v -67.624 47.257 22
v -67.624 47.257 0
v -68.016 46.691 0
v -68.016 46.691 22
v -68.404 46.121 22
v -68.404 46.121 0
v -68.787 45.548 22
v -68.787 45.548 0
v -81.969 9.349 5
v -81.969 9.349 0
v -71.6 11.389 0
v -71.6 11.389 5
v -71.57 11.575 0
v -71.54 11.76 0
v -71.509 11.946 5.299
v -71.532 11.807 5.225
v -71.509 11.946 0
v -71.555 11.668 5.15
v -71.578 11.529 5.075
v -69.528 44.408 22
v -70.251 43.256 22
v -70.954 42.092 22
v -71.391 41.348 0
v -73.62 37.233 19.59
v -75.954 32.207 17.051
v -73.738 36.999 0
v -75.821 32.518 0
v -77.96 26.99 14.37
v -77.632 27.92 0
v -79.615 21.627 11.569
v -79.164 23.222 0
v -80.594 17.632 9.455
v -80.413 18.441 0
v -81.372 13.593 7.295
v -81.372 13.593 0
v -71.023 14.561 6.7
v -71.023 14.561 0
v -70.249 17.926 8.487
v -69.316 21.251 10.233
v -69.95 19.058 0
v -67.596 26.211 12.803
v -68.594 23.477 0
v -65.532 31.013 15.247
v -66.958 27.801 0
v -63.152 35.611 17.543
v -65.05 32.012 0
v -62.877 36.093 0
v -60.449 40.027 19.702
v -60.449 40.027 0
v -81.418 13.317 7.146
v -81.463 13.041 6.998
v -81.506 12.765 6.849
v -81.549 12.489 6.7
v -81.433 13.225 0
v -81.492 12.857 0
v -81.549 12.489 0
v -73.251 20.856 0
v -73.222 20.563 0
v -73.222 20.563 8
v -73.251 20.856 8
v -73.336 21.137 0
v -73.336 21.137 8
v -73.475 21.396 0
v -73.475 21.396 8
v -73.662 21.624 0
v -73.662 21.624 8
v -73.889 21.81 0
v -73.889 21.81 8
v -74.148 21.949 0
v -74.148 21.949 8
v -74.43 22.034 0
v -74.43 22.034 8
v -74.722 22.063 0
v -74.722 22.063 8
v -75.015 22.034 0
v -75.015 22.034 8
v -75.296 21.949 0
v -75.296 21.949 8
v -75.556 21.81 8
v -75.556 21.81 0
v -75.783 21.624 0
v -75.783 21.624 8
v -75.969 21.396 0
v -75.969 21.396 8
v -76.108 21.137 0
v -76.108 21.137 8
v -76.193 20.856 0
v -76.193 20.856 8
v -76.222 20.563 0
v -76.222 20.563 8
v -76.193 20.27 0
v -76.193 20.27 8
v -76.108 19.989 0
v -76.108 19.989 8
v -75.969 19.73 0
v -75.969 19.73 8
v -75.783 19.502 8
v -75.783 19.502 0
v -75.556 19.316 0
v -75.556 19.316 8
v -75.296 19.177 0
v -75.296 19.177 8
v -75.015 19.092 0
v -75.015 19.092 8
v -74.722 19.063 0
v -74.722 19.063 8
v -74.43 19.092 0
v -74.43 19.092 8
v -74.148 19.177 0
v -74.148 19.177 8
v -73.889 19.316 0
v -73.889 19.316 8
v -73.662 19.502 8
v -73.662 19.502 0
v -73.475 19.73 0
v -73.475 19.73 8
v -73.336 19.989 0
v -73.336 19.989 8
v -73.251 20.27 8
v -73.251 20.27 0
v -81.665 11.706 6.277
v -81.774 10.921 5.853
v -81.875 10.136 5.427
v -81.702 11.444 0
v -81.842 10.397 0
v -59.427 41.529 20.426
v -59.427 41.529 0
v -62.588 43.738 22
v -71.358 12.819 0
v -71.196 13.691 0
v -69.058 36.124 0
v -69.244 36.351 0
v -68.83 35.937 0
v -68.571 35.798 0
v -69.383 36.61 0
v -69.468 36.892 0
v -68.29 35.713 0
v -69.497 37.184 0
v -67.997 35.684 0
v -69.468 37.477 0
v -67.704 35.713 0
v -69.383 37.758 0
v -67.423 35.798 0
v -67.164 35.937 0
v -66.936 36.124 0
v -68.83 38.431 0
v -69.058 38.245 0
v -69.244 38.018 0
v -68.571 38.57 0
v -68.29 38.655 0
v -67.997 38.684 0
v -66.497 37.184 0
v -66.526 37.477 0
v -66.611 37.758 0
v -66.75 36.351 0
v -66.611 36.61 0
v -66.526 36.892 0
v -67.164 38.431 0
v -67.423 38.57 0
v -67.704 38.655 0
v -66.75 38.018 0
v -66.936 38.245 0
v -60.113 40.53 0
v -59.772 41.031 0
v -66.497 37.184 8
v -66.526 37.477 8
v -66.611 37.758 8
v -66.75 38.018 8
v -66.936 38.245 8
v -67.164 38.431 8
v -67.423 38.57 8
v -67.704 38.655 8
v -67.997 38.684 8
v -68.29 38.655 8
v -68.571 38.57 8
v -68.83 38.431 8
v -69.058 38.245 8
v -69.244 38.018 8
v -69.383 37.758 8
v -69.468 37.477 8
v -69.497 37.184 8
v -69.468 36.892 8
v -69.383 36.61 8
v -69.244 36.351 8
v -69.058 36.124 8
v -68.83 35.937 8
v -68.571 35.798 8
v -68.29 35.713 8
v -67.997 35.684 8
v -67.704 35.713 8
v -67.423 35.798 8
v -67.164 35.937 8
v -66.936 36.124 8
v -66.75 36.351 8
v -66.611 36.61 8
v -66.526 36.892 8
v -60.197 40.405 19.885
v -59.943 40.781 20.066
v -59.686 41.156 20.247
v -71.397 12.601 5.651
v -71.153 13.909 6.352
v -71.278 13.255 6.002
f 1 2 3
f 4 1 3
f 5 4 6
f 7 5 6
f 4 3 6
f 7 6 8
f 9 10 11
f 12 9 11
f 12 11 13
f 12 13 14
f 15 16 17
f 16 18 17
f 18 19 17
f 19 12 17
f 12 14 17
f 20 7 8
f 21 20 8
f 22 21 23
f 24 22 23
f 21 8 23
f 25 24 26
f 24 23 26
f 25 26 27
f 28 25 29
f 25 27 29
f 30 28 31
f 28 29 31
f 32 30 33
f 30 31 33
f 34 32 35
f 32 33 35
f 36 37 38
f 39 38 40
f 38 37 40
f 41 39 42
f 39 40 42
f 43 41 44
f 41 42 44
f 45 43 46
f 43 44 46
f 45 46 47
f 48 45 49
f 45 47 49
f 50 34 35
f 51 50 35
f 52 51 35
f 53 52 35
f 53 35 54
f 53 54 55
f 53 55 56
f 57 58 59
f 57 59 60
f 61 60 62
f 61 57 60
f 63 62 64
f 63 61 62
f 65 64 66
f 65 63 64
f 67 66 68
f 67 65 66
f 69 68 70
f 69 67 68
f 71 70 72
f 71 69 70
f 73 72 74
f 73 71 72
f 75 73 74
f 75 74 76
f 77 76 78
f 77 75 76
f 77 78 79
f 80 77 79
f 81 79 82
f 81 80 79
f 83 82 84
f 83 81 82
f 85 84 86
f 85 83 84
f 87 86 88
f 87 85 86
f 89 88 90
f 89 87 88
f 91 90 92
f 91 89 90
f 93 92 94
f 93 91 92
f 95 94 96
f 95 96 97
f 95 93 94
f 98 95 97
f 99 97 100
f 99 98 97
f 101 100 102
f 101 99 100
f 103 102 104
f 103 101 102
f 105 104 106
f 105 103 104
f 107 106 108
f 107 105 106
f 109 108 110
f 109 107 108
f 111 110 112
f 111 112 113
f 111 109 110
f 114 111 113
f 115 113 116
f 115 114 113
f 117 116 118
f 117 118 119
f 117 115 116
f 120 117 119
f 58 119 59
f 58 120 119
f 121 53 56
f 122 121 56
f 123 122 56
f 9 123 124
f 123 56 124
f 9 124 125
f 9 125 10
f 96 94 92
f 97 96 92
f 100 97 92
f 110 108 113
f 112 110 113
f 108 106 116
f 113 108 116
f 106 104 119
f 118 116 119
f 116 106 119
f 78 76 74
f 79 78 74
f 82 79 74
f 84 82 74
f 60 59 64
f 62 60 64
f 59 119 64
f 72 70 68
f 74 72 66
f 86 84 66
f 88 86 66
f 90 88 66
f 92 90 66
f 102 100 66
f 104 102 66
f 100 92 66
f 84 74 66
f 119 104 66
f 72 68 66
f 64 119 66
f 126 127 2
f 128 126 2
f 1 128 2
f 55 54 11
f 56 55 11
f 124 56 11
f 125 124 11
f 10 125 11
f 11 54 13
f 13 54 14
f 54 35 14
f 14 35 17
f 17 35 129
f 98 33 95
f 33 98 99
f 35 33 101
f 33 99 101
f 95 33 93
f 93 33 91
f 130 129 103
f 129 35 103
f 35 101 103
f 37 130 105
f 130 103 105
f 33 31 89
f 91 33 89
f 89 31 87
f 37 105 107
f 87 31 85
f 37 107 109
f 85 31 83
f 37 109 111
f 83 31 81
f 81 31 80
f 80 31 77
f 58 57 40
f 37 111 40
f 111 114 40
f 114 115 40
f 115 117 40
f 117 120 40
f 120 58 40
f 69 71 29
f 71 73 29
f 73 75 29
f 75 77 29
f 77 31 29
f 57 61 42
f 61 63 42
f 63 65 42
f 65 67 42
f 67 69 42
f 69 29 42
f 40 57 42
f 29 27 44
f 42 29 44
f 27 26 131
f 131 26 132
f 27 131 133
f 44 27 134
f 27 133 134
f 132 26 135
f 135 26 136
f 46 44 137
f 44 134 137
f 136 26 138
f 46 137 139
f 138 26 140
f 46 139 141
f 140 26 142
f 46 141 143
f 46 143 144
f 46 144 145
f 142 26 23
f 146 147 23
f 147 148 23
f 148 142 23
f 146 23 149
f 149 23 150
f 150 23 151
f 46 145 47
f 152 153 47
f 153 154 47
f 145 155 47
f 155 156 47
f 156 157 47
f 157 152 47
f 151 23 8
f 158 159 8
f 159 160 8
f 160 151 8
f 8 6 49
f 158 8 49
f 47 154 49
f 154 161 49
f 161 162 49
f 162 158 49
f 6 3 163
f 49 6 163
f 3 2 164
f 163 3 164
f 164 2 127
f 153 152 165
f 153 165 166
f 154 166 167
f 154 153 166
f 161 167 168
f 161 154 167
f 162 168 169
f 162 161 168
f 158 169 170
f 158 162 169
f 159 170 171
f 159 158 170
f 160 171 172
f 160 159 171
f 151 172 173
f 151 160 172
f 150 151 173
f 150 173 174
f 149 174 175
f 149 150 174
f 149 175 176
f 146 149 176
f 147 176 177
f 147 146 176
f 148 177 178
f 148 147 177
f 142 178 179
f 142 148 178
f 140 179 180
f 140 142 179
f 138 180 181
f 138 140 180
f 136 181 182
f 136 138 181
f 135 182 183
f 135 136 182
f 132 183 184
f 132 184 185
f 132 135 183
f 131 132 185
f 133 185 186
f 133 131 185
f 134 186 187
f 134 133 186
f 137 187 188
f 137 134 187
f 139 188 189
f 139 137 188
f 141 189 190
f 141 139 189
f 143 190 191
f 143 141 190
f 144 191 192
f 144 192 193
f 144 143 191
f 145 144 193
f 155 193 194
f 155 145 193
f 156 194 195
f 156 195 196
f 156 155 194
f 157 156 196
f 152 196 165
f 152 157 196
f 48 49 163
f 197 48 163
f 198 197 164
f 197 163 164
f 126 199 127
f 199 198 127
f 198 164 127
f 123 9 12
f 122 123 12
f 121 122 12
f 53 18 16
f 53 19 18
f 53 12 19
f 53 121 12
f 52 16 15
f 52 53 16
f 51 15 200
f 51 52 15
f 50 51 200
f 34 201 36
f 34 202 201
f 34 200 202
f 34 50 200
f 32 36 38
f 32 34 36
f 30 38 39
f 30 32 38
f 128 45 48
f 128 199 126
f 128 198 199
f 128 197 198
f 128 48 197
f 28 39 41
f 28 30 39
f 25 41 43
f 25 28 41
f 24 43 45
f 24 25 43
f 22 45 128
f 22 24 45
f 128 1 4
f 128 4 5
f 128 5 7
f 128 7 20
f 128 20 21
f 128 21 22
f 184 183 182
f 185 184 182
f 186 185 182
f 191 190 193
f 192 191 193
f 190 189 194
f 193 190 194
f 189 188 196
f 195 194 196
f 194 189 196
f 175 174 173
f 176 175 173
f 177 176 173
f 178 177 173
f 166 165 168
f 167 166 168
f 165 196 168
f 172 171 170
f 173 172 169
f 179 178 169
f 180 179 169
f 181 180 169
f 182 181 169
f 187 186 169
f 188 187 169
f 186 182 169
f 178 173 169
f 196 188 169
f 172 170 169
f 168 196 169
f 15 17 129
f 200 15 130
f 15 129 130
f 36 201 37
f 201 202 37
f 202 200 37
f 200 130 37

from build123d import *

# Parameters (mm, degrees)
F0_R        = 1.5
F1_DEPTH    = 22
F2_T1_DEPTH = 165.8159550338
F3_DEPTH    = 8


# Not quite as in the source:
# - a fillet or chamfer that OpenCascade refuses, or shapes differently, is made with other operations: its cross-section is extruded or revolved along the edge and cut away or added


with BuildPart() as f1:
    # F0 (on Top) → F1 (new body)
    with BuildSketch(Plane.XY):
        with BuildLine():
            ThreePointArc((-71.5091042417, 11.9456272565), (-71.2779515077, 13.2553245479), (-71.0228136012, 14.5605613962))
            Line((-71.0228136012, 14.5605613962), (-78.4331581972, 13.1022935094))
            Line((-78.4331581972, 13.1022935094), (-71.5091042417, 11.9456272565))
        make_face()
        with BuildLine():
            ThreePointArc((-71.0228136012, 14.5605613962), (-66.9578457789, 27.8010231583), (-60.4491628751, 40.0268498348))
            Line((-60.4491628751, 40.0268498348), (-68.7869784441, 45.5477946397))
            ThreePointArc((-68.7869784441, 45.5477946397), (-76.7608906967, 30.2326918988), (-81.3724289647, 13.5932999815))
            Line((-81.3724289647, 13.5932999815), (-78.4331581972, 13.1022935094))
            Line((-78.4331581972, 13.1022935094), (-71.0228136012, 14.5605613962))
        make_face()
        with Locations((-74.7222680365, 20.5628952117)):
            Circle(F0_R, mode=Mode.SUBTRACT)
        with Locations((-67.9969340878, 37.184229919)):
            Circle(F0_R, mode=Mode.SUBTRACT)
        with BuildLine():
            ThreePointArc((-60.4491628751, 40.0268498348), (-59.9428373222, 40.7811997588), (-59.4270987125, 41.5291456523))
            Line((-59.4270987125, 41.5291456523), (-67.6239399142, 47.2573036734))
            ThreePointArc((-67.6239399142, 47.2573036734), (-68.2108148839, 46.4061928289), (-68.7869784441, 45.5477946397))
            Line((-68.7869784441, 45.5477946397), (-60.4491628751, 40.0268498348))
        make_face()
        with BuildLine():
            ThreePointArc((-71.5997882434, 11.3894830218), (-71.554986557, 11.667643242), (-71.5091042417, 11.9456272565))
            Line((-71.5091042417, 11.9456272565), (-78.4331581972, 13.1022935094))
            Line((-78.4331581972, 13.1022935094), (-81.5492033125, 12.4890928052))
            ThreePointArc((-81.5492033125, 12.4890928052), (-81.7739574871, 10.9210748966), (-81.9685648448, 9.3490308206))
            Line((-81.9685648448, 9.3490308206), (-71.5997882434, 11.3894830219))
        make_face()
        with BuildLine():
            Line((-81.5492033125, 12.4890928052), (-78.4331581972, 13.1022935094))
            Line((-78.4331581972, 13.1022935094), (-81.3724289647, 13.5932999815))
            ThreePointArc((-81.3724289647, 13.5932999815), (-81.462687068, 13.0414959135), (-81.5492033125, 12.4890928052))
        make_face()
        with Locations((-67.9969340878, 37.184229919)):
            Circle(F0_R)
        with Locations((-74.7222680365, 20.5628952117)):
            Circle(F0_R)
    extrude(amount=F1_DEPTH)

    # F2: chamfer of 17 x 30 on 1 edges, made by hand

    # F2_s2 → F2_t1 (cut)
    with BuildSketch(Plane(origin=(-153.3048702431, -30.1685793773, 0), x_dir=(0, 0, 1), z_dir=(0.9811820369, 0.1930849823, 0))):
        Polygon((5, -25), (22, -55), (22, -25), align=None)
    extrude(amount=F2_T1_DEPTH, mode=Mode.SUBTRACT)

    # F0 (on Top) → F3 (cut)
    with BuildSketch(Plane.XY):
        with Locations((-67.9969340878, 37.184229919)):
            Circle(F0_R)
        with Locations((-74.7222680365, 20.5628952117)):
            Circle(F0_R)
    extrude(amount=F3_DEPTH, mode=Mode.SUBTRACT)


solid = f1.part
